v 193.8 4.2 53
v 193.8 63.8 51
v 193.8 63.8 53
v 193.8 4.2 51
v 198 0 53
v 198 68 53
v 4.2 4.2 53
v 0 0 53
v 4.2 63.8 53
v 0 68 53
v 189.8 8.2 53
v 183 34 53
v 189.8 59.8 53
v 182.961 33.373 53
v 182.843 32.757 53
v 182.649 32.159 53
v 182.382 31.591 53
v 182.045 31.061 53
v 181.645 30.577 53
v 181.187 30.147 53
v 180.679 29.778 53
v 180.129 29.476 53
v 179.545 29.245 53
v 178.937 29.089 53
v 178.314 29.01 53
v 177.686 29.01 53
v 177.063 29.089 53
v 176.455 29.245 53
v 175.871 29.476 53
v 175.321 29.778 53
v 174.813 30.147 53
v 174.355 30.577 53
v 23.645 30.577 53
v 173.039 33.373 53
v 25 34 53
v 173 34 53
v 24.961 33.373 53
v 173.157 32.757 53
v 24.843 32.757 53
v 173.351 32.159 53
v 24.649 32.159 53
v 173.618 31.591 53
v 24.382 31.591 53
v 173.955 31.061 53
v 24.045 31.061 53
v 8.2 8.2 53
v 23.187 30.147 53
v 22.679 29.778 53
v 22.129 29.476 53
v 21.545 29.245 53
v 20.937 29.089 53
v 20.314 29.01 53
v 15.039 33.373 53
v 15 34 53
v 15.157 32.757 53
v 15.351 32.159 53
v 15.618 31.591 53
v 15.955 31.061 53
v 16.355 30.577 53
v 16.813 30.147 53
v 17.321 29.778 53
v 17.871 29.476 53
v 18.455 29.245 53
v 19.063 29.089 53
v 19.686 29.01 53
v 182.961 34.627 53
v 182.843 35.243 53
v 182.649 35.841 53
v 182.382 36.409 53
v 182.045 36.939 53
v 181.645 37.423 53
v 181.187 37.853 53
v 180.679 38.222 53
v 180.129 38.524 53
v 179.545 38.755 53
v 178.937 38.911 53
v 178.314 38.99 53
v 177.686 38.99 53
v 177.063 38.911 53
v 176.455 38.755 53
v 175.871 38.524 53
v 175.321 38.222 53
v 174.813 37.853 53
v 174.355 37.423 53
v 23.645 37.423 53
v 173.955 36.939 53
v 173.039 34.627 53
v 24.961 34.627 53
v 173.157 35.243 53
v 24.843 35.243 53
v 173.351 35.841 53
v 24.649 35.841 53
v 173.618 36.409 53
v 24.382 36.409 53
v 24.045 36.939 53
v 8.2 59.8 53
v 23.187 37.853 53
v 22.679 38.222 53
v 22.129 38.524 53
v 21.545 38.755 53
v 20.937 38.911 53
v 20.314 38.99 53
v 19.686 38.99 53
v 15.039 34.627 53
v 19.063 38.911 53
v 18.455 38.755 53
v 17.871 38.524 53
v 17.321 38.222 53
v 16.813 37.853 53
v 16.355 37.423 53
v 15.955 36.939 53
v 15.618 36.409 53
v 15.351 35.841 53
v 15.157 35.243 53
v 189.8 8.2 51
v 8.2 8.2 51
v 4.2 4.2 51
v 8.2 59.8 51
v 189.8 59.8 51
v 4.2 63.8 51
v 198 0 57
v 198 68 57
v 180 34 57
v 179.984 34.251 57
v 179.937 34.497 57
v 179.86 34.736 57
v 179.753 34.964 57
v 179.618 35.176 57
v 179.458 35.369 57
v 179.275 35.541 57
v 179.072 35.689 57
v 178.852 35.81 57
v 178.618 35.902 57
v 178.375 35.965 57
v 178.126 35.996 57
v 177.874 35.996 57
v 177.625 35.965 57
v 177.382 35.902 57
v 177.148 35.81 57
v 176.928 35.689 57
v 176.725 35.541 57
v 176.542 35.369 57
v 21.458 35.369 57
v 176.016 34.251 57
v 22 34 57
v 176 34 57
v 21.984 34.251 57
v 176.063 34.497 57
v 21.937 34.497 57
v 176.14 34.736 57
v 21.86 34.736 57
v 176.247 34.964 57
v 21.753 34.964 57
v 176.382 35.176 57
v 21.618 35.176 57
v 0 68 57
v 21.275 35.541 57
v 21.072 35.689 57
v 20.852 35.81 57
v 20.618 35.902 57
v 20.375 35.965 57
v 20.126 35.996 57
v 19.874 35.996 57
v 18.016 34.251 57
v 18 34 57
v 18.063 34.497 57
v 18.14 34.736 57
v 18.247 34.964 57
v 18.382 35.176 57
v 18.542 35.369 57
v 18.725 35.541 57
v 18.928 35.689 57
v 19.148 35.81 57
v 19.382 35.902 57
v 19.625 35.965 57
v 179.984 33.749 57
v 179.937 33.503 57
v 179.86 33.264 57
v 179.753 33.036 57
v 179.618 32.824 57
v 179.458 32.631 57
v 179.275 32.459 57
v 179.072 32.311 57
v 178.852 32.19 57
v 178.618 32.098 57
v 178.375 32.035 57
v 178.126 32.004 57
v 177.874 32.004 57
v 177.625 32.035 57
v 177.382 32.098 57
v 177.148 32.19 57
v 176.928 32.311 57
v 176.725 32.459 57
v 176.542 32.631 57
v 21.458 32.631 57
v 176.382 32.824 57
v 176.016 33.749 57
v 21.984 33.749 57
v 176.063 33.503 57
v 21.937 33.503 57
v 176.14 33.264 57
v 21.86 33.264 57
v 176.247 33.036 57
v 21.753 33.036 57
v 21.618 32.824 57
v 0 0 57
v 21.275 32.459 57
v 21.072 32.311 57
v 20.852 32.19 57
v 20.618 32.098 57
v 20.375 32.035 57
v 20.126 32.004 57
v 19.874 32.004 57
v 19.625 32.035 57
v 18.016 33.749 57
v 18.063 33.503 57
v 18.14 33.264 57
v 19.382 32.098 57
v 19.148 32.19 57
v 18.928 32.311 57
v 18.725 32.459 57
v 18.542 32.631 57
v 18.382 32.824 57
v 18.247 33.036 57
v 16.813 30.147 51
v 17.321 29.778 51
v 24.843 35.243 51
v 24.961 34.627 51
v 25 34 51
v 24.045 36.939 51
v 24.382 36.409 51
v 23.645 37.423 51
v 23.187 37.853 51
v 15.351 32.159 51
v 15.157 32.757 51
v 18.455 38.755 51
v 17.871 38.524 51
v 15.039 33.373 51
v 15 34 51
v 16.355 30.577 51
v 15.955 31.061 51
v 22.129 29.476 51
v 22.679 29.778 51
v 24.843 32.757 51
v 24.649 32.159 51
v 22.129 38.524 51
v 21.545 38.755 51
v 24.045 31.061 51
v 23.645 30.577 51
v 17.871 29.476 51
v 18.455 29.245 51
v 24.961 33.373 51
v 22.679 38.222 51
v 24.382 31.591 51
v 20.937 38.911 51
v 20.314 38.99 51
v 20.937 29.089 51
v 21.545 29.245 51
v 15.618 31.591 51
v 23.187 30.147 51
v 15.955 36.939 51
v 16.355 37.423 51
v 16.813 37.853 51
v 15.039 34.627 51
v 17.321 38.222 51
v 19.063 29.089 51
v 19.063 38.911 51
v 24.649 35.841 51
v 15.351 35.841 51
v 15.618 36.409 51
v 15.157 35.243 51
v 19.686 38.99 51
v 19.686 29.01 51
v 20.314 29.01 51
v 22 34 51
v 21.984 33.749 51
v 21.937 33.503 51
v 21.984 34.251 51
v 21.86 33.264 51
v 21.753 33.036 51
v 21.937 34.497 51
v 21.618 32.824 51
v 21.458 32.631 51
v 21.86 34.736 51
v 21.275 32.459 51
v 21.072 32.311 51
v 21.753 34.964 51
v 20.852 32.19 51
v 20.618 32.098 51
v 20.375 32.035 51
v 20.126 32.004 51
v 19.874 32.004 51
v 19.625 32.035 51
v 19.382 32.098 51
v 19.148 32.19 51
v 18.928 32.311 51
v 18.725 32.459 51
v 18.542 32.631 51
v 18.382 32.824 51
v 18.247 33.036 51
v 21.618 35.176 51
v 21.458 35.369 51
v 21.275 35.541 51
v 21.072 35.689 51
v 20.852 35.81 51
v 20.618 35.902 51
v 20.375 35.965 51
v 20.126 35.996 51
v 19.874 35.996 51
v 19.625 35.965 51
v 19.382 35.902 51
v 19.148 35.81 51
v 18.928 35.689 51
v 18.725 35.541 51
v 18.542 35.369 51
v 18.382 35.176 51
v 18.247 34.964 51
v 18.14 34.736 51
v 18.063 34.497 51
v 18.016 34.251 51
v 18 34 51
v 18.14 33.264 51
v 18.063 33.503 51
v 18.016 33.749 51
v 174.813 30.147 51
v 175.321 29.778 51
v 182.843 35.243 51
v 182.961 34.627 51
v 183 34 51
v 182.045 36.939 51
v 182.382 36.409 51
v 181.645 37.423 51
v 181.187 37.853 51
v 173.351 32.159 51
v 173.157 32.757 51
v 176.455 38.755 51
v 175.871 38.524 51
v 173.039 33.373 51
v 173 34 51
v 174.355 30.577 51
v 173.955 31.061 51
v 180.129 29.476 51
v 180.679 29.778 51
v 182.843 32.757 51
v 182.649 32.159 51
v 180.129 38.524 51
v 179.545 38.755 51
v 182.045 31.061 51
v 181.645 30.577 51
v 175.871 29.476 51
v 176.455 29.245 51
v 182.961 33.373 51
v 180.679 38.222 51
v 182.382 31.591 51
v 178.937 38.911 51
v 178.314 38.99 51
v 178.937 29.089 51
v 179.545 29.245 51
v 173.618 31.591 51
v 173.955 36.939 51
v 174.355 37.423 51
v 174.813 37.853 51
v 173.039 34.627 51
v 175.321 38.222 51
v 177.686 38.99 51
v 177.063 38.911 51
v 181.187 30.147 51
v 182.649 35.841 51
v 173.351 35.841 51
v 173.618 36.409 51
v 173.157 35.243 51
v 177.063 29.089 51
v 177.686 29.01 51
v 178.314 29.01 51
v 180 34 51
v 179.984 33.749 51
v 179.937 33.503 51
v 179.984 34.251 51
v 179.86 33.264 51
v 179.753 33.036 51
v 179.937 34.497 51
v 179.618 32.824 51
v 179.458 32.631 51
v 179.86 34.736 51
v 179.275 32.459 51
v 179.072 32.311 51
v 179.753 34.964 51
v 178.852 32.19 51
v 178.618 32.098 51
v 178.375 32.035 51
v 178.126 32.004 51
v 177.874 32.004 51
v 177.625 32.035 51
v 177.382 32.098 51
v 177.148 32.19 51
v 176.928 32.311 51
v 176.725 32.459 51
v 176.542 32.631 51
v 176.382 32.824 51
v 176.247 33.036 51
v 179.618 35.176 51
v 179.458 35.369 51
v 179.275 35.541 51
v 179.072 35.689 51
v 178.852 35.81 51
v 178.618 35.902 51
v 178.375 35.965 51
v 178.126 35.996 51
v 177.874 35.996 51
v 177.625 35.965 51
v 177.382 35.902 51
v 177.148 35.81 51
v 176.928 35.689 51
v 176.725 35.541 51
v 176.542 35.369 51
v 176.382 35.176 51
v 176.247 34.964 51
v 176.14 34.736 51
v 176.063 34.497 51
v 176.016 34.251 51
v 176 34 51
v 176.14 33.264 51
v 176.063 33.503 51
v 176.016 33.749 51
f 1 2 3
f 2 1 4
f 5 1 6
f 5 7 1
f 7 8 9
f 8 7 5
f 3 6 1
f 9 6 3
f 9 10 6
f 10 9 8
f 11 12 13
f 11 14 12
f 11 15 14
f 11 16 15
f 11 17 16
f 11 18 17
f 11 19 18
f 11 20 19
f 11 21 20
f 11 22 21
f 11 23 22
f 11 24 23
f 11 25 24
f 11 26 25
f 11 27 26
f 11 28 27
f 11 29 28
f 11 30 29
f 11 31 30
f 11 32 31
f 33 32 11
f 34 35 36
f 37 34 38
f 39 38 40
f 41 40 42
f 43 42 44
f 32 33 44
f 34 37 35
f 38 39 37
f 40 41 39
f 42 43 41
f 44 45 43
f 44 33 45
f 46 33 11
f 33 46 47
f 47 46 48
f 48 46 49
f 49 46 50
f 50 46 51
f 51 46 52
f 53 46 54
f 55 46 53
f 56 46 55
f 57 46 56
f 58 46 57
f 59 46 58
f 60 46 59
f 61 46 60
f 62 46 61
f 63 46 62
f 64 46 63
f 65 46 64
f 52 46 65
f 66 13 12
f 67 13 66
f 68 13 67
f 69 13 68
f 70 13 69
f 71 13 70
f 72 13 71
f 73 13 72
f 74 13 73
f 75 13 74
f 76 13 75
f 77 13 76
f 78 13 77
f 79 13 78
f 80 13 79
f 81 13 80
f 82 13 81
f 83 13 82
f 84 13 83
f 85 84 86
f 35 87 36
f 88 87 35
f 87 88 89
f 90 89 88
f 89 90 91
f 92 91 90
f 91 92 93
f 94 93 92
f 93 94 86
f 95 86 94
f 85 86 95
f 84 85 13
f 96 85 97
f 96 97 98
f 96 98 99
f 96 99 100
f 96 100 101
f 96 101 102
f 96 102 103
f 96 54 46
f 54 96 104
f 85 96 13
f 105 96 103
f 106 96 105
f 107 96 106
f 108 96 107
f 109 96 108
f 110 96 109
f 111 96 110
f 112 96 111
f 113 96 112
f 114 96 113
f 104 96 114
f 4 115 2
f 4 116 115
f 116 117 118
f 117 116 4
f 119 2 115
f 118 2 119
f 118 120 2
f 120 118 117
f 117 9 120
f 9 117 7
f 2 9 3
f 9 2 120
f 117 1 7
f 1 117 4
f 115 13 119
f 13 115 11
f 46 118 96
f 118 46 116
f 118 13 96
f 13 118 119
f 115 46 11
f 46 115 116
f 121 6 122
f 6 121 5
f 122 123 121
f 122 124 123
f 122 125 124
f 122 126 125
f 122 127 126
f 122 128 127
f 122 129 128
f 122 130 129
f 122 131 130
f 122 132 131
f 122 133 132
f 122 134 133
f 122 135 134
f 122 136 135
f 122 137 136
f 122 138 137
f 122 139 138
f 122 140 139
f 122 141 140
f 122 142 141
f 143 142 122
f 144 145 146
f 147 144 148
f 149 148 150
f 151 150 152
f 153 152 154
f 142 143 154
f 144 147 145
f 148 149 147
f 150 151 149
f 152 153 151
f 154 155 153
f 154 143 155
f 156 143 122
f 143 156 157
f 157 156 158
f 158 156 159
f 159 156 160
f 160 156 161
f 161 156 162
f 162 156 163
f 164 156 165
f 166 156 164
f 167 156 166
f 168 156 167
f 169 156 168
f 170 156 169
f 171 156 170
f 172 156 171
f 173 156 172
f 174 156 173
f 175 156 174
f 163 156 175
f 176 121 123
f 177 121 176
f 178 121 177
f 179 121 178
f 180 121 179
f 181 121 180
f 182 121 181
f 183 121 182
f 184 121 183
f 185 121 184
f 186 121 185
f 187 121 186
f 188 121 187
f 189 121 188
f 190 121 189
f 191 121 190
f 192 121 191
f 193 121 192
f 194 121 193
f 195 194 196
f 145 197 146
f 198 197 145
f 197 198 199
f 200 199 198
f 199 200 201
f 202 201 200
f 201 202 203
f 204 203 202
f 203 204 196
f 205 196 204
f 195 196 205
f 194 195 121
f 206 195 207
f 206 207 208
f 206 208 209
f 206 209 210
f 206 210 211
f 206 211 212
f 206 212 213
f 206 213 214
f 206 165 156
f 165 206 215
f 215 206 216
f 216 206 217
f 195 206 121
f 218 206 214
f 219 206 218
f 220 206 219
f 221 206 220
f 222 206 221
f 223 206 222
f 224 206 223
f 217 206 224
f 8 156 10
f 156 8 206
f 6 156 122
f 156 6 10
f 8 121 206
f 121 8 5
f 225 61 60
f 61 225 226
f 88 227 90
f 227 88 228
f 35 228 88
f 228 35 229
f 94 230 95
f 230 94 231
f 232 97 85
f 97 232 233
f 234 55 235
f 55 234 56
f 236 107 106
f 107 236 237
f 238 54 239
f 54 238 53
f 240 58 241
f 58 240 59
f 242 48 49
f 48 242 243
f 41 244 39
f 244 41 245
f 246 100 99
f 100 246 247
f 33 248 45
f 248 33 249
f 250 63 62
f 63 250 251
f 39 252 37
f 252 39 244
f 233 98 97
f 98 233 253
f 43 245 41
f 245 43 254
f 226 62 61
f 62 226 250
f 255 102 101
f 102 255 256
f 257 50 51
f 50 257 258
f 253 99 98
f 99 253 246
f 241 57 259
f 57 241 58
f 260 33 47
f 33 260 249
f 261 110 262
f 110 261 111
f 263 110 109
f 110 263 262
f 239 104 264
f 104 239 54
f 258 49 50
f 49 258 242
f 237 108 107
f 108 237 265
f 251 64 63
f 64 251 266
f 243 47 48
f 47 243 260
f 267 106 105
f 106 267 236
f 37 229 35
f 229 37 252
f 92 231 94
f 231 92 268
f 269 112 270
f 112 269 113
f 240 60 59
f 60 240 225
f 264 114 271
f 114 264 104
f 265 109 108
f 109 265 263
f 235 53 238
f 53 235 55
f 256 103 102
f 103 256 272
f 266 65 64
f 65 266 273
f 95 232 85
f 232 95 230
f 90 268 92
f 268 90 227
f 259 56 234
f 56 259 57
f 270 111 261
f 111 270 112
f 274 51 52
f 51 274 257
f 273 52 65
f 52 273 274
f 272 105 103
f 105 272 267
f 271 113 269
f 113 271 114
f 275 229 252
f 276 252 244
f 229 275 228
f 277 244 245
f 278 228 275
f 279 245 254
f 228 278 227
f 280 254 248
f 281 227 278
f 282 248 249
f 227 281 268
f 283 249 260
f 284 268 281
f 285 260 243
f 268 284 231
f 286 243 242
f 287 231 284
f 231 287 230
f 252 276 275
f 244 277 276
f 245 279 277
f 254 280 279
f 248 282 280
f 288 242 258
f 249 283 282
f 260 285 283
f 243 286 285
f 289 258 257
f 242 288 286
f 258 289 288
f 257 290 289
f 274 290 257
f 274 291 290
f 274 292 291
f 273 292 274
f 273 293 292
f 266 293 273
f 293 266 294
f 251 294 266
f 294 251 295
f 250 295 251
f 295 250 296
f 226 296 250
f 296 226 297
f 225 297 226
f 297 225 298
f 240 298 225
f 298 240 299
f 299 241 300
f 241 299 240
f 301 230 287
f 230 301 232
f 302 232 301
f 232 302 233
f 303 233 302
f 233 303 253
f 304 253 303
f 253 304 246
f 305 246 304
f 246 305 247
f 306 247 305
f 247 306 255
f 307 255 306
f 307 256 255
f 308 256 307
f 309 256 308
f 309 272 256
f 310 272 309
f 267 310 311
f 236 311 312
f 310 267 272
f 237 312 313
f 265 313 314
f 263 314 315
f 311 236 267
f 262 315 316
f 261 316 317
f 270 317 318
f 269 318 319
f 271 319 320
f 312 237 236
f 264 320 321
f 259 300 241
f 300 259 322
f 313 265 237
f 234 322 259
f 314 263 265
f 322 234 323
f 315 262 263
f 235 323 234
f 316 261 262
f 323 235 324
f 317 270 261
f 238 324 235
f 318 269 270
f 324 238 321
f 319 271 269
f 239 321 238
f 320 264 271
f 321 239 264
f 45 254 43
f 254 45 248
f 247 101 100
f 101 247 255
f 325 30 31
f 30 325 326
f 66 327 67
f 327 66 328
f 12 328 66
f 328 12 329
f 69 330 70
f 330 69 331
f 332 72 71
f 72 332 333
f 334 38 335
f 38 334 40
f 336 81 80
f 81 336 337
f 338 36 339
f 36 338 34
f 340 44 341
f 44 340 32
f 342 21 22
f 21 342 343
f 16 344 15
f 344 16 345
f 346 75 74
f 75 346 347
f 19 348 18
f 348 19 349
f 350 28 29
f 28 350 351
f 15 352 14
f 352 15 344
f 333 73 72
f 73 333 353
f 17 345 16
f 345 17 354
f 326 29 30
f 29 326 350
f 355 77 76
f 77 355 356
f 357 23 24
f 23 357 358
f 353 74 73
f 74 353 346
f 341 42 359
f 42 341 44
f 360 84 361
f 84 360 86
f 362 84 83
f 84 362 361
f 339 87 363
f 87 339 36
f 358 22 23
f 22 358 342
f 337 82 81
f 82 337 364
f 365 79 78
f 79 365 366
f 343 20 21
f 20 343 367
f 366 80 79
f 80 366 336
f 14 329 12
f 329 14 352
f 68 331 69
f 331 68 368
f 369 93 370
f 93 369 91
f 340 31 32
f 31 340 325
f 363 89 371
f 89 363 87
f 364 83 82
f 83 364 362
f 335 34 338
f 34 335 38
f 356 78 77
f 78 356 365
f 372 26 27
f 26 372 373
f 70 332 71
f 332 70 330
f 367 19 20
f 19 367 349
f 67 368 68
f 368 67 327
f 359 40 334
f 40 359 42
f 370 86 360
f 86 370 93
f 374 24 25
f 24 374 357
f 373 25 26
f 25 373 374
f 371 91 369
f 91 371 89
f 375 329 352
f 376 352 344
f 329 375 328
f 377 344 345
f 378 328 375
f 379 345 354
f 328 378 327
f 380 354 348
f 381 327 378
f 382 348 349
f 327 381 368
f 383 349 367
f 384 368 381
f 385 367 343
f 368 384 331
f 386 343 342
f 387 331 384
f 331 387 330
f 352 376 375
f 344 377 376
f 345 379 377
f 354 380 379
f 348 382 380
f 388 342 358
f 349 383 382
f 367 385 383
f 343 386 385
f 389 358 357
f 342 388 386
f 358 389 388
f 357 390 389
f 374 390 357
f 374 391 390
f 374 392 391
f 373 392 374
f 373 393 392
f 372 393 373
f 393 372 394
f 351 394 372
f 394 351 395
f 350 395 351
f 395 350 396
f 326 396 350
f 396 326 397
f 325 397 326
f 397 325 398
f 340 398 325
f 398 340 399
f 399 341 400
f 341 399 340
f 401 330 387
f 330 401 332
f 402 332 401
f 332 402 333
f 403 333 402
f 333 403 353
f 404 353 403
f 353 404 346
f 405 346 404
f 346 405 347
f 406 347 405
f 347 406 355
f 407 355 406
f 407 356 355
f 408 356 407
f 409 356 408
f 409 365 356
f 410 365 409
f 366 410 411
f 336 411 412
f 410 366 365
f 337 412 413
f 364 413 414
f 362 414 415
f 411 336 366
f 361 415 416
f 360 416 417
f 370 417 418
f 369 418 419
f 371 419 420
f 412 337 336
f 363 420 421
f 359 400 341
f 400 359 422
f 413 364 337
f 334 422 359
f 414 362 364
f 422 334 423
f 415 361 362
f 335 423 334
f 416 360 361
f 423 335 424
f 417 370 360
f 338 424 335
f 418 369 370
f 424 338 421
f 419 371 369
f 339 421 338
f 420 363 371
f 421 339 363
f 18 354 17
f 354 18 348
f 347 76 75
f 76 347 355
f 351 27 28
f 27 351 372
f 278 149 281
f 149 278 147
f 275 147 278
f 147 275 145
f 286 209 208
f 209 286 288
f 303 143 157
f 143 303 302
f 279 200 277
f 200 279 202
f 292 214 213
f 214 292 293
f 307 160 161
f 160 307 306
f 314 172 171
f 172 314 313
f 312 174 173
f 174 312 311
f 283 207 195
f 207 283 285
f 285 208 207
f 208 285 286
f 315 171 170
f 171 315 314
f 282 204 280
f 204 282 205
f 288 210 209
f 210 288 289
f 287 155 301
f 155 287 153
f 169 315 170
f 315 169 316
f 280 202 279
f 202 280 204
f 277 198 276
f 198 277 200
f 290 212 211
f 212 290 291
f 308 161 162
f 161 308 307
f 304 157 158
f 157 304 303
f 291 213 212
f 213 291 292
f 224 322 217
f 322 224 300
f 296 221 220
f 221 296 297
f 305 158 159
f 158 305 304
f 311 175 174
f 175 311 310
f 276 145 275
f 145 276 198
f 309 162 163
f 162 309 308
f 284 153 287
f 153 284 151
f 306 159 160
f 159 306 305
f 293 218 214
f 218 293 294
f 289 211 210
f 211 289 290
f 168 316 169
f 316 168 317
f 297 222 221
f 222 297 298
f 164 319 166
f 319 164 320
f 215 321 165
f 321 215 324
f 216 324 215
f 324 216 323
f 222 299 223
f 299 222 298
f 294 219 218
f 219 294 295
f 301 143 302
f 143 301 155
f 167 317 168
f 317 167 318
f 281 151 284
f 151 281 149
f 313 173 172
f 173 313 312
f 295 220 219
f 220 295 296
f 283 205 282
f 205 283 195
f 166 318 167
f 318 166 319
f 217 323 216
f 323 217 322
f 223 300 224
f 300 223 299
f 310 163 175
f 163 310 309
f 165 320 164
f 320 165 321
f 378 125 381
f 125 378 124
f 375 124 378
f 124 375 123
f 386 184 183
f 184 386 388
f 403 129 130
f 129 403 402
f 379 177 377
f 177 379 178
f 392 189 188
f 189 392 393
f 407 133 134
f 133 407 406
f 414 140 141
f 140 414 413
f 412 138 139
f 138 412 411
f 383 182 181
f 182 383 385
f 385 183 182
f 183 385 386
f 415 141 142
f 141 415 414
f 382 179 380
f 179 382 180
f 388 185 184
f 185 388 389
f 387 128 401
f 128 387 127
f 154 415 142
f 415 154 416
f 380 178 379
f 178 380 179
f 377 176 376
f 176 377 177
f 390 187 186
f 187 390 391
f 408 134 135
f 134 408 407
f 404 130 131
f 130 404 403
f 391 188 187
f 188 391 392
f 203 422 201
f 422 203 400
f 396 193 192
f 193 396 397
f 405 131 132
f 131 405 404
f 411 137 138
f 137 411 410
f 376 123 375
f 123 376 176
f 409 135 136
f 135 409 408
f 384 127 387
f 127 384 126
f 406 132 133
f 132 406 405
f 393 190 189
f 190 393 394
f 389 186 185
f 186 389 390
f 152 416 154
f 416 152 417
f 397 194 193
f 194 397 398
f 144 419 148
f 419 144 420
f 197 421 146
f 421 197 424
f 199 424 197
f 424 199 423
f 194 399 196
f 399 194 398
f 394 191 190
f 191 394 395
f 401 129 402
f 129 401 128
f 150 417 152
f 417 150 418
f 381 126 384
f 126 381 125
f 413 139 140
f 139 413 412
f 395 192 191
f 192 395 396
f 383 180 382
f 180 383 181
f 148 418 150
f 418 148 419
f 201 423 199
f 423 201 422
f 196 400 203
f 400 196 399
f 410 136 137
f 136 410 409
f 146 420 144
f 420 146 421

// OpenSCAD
/*
 * LED Panel Ceiling Mount Box
 * 
 * Dieses 3D-Modell erstellt ein komplettes Montagesystem für LED-Panels an der Decke.
 * Das System besteht aus drei Hauptkomponenten:
 * 1. Hauptgehäuse (panel_box) - Aufnahme für Elektronik und Verkabelung
 * 2. Deckel (panel_cover) - Verschluss mit Clips für einfachen Zugang
 * 3. Panel-Halterung (panel_mount) - Befestigung für das LED-Panel
 * 
 * Autor: frickeldave
 * Datum: 2025
 */

$fn = 50; // Auflösung für runde Objekte (höhere Werte = glattere Oberflächen)

// =============================================================================
// KONFIGURATIONSPARAMETER
// =============================================================================

// Innenmaße des Gehäuses
cm_width = 190;                 // Innenbreite des Gehäuses in mm
cm_depth = 60;                  // Innentiefe des Gehäuses in mm  
cm_height = 45;                 // Innenhöhe des Gehäuses in mm
cm_thickness = 4;               // Wandstärke des Materials in mm

// Kabelausgang-Parameter
cm_coh_diameter = 28.1;         // Durchmesser des Kabelausgangs in mm
cm_coh_length = 10;             // Länge des Kabelausgangs-Rohrs in mm
cm_coh_ceiling_distance = 15;   // Abstand des Kabelausgangs zur Decke in mm

// LED-Panel Montage
cm_led_mount = 16;              // Durchmesser des Montagestabs für das LED-Panel in mm


// =============================================================================
// MODUL: LED-PANEL HALTERUNG
// =============================================================================

/*
 * Erstellt eine Halterung für das LED-Panel
 * 
 * Parameter:
 * st = Stick thickness - Dicke des Montagestabs
 * md = Mount depth - Tiefe der Verstärkung 
 * mw = Mount width - Breite der Verstärkung
 */
module panel_mount(st, md, mw) {
    difference() {
        
        union() {
            // Verstärkungszylinder für die Panel-Halterung
            // Sorgt für zusätzliche Stabilität an der Befestigungsstelle
            translate([0, 0, -0])
            rotate([0, 90, 0])
            cylinder(h = mw, r = md / 2);

            // Montagestab für das LED-Panel
            // Angewinkelt für optimale Panel-Positionierung
            translate([40, 0, -0])
            rotate([0, 140, 0])
            cylinder(h = 100, r = st / 2);
        }

        // Abschrägung für den Verstärkungszylinder
        // Formel: d = a * sqrt(2) für 45-Grad-Abschrägung
        color("red")
        translate([-(md * sqrt(2)) / 2, -(md * sqrt(2)) / 2, -(md * sqrt(2)) / 2])
        rotate([0, 45, 0])
        cube([md, md * 2, md]);

        // Obere Aussparung für saubere Kanten
        color("red")
        translate([mw / 2, 0, md / 4])
        cube([mw + 2, md + 2, md / 2 + 30], center=true);

        // Befestigungsloch für Schraube (M5)
        color("red")
        translate([mw / 2, 0, - md / 2 - 1])
        cylinder(h=40, r = 2.5);

    }
}

// =============================================================================
// MODUL: HAUPTGEHÄUSE
// =============================================================================

/*
 * Erstellt das Hauptgehäuse für die LED-Panel Elektronik
 * 
 * Parameter:
 * w = inner width - Innenbreite des Gehäuses
 * d = inner depth - Innentiefe des Gehäuses
 * h = inner height - Innenhöhe des Gehäuses
 * t = thickness - Wandstärke des Materials
 * col = cable outlet length - Länge des Kabelausgang-Rohrs
 * codis = cable outlet distance - Abstand des Kabelausgangs zur Decke
 * cohdia = cable outlet diameter - Durchmesser des Kabelausgangs
 */
module panel_box(w, d, h, t, col, codis, cohdia) {
    
    /*
     * Hilfsfunktion: Verstärkungsrippen für das Gehäuse
     * Erhöht die Stabilität und verhindert Verformungen
     */
    module box_reinforcement(w, d, h) {
        difference() {
            cube([w, d, h]);

            // Aussparung für Materialersparnis bei gleicher Stabilität
            color("red")
            translate([-1, w, w])
            cube([w + 2, d - w * 2, h]);
        }
    }

    /*
     * Hilfsfunktion: Belüftungsschlitze
     * Sorgt für Luftzirkulation und Wärmeableitung
     */
    module box_cooling(w, d, h) {
        
        // Runde Enden für besseren Luftstrom
        translate([0, d, h / 2])
        rotate([90, 0, 0])
        cylinder(h = d, r = h / 2);
        
        // Rechteckiger Hauptschlitz
        cube([w, d, h]);

        // Runde Enden (andere Seite)
        translate([w, d, h / 2])
        rotate([90, 0, 0])
        cylinder(h = d, r = h / 2);

    }

    difference() {
        
        union() {
            // Das Hauptgehäuse - Außenwände mit Wandstärke
            cube([w + t * 2, d + t * 2, h + t * 2]);

            // Äußerer Ring des Kabelausgangs
            // Verstärkung um das Kabelausgangsloch
            translate([-col, d / 2 + t, h - cohdia / 2 - codis + t])
            rotate([0, 90, 0])
            cylinder(h=col, r=cohdia / 2 + t * 2);

        }

        // Unterkante des äußeren Rings abschneiden 
        // Sorgt für eine gerade Kante am Gehäuse
        color("green")
        translate([-col - 1, 0, - t - 1])
        cube([col + 2 + 1, d + t * 2, t + 1]);
        
        // Innenraum des Gehäuses ausschneiden
        translate([t, t, t])
        cube([w, d, h + t + 1]);

        // Kabelausgang an der Rückseite
        // Für Netzanschlusskabel zur Decke
        translate([-col - 1, d / 2 + t,  h - cohdia / 2 - codis + t])
        rotate([0, 90, 0])
        cylinder(h = col + t + 2, r = cohdia / 2);

        // Befestigungslöcher für Montageschrauben (vorne links)
        color("red")
        translate([t + 5, 1 + t, h - 5])
        rotate([90, 0, 0])
        cylinder(h = t * 2, r = 2);

        // Befestigungslöcher für Montageschrauben (vorne mitte)
        color("red")
        translate([w /2, 1 + t, h - 5])
        rotate([90, 0, 0])
        cylinder(h = t * 2, r = 2);

        // Befestigungslöcher für Montageschrauben (vorne rechts)
        color("red")
        translate([w - t - 5, 1 + t, h - 5])
        rotate([90, 0, 0])
        cylinder(h = t * 2, r = 2);

        // Befestigungslöcher für Montageschrauben (hinten links)
        color("red")
        translate([t + 5, d + 1 + t * 2, h - 5])
        rotate([90, 0, 0])
        cylinder(h = t * 2, r = 2);

        // Befestigungslöcher für Montageschrauben (hinten mitte)
        color("red")
        translate([w /2, d + 1 + t * 2, h - 5])
        rotate([90, 0, 0])
        cylinder(h = t * 2, r = 2);

        // Befestigungslöcher für Montageschrauben (hinten rechts)
        color("red")
        translate([w - t - 5, d + 1 + t * 2, h - 5])
        rotate([90, 0, 0])
        cylinder(h = t * 2, r = 2);

        // Kabeldurchführung für LED-Panel Stromkabel
        // Durchmesser 15mm für Standard-Stromkabel
        color("red")
        translate([w -20, d / 2, -1])
        cylinder(h = t + 2, r = 7.5);

        // Belüftungsschlitze für Wärmeableitung
        // Verteilt über die gesamte Breite für optimale Kühlung
        for(i = [0 : w / 5 : w]) {

            if(i < w) {
                // Belüftungsschlitze vorne
                color("red")
                translate([i + 8, -1, h - 15])
                box_cooling(w / 5 - 12, t + 2, 3);

                // Belüftungsschlitze hinten
                color("red")
                translate([i + 8, d + t -1, h - 15])
                box_cooling(w / 5 - 12, t + 2, 3);
            }
        }

        // Befestigungsloch für die LED-Halterung
        // M5 Schraube zur Montage der Panel-Halterung
        color("red")
        translate([28.5, d / 2 + 2.0, -20])
        cylinder(h=40, r = 2.5);
    }

    // Verstärkungsrippen im Inneren
    // Erhöhen die Stabilität ohne viel zusätzliches Material
    for(i = [0 : w / 5 : w]) {
        color("cyan")
        translate([i + 1, t, t])
        box_reinforcement(2, d, h - 12);
    }

}

// =============================================================================
// MODUL: GEHÄUSE-DECKEL
// =============================================================================

/*
 * Erstellt den Deckel für das Hauptgehäuse
 * 
 * Parameter:
 * w = width - Breite des Deckels
 * d = depth - Tiefe des Deckels  
 * h = height - Höhe des Deckels
 * t = thickness - Wandstärke des Materials
 */
module panel_cover(w, d, h, t) {

    /*
     * Hilfsfunktion: Befestigungsclips
     * Ermöglicht werkzeuglose Montage des Deckels
     * 
     * Parameter:
     * d = depth - Tiefe des Clips
     */
    // module clip(d) {

    //     difference() {
    //         union() {
                
    //             // Oberer Teil des Clips (vorne)
    //             // Bildet die Haltekante
    //             color("green")
    //             translate([0, 0, 0])
    //             cube([10, 4, 10]);

    //             // Unterer runder Teil des Clips (vorne)
    //             // Ermöglicht das Einrasten
    //             color("green")
    //             translate([5, 4, 0])
    //             rotate([90, 0, 0])
    //             cylinder(h = 4, r = 5);

    //             // Verstärkung zwischen vorderem und hinterem Clip
    //             color("green")
    //             translate([0, 4, 8])
    //             cube([10, d - 8, 2]);

    //             // Oberer Teil des Clips (hinten)
    //             color("green")
    //             translate([0, d - 4, 0])
    //             cube([10, 4, 10]);

    //             // Unterer runder Teil des Clips (hinten)
    //             color("green")
    //             translate([5, d, 0])
    //             rotate([90, 0, 0])
    //             cylinder(h = 4, r = 5);
    //         }

    //         // Befestigungsloch für Einschmelzmutter (vorne)
    //         // M5 Gewinde für sichere Verbindung
    //         color("red")
    //         translate([5, 5, 1])
    //         rotate([90, 0, 0])
    //         cylinder(h = 4 + 2, r = 2.5);

    //         // Befestigungsloch für Einschmelzmutter (hinten)
    //         color("red")
    //         translate([5, d + 1, 1])
    //         rotate([90, 0, 0])
    //         cylinder(h = 4 + 2, r = 2.5);
    //     }
    // }

    difference() {
        union() {
            // Die Deckelplatte
            color("blue")
            cube([w, d, t]);

            // Innenrahmen für bessere Passgenauigkeit
            // Verhindert seitliches Verrutschen des Deckels
            difference() {

                color("cyan")
                translate([t + 0.2, t + 0.2, - t + 2])
                cube([w - t * 2 - 0.4, d - t * 2 - 0.4, 2]);

                // Innere Aussparung für Materialersparnis
                translate([t * 2 + 0.2, t * 2 + 0.2, - t +1])
                cube([w - t * 4 - 0.4, d - t * 4 - 0.4, 4]);
            }

            // // Befestigungsclip links
            // translate([t, t + 0.2, -10])
            // clip(d - t * 2 - 0.4);

            // // Befestigungsclip mitte
            // translate([w / 2 - 7, t + 0.2, -10])
            // clip(d - t * 2 - 0.4);

            // // Befestigungsclip rechts
            // translate([w - 16, t + 0.2, -10])
            // clip(d - t * 2 - 0.4);

            // Zusätzlicher Befestigungspunkt links
            // Für optionale Schraubverbindung
            color("cyan")
            translate([20, d / 2, -t +2])
            cylinder(h = 2, r = 5);

            // Zusätzlicher Befestigungspunkt rechts
            color("cyan")
            translate([w - 20, d / 2, -t + 2])
            cylinder(h = 2, r = 5);
        }

        // Befestigungsloch links (M4 Schraube)
        color("red")
        translate([20, d / 2, -t +1])
        cylinder(h = t + 2 + 2, r = 2);

        // Befestigungsloch rechts (M4 Schraube)
        color("red")
        translate([w - 20, d / 2, -t + 1])
        cylinder(h = t + 2 + 2, r = 2);

    }
}

// =============================================================================
// OBJEKTERSTELLUNG UND RENDERING
// =============================================================================

/*
 * Hier werden die einzelnen Komponenten gerendert.
 * Kommentiere die gewünschten Teile ein/aus je nach Bedarf.
 */

// LED-Panel Halterung rendern
// Aktivieren für 3D-Druck der Halterung
//translate([-10, cm_depth / 2 + cm_thickness, 15])
//panel_mount(cm_led_mount, cm_depth, 77);

// Hauptgehäuse rendern  
// Aktivieren für 3D-Druck des Gehäuses
//panel_box(cm_width, cm_depth, cm_height, cm_thickness, cm_coh_length, cm_coh_ceiling_distance, cm_coh_diameter);

// Deckel rendern
// Aktivieren für 3D-Druck des Deckels
// Position: Oberhalb des Gehäuses für Montage-Vorschau
translate([0, 0, cm_height + cm_thickness * 2])
panel_cover(cm_width + cm_thickness * 2, cm_depth + cm_thickness * 2, cm_height, cm_thickness); 
